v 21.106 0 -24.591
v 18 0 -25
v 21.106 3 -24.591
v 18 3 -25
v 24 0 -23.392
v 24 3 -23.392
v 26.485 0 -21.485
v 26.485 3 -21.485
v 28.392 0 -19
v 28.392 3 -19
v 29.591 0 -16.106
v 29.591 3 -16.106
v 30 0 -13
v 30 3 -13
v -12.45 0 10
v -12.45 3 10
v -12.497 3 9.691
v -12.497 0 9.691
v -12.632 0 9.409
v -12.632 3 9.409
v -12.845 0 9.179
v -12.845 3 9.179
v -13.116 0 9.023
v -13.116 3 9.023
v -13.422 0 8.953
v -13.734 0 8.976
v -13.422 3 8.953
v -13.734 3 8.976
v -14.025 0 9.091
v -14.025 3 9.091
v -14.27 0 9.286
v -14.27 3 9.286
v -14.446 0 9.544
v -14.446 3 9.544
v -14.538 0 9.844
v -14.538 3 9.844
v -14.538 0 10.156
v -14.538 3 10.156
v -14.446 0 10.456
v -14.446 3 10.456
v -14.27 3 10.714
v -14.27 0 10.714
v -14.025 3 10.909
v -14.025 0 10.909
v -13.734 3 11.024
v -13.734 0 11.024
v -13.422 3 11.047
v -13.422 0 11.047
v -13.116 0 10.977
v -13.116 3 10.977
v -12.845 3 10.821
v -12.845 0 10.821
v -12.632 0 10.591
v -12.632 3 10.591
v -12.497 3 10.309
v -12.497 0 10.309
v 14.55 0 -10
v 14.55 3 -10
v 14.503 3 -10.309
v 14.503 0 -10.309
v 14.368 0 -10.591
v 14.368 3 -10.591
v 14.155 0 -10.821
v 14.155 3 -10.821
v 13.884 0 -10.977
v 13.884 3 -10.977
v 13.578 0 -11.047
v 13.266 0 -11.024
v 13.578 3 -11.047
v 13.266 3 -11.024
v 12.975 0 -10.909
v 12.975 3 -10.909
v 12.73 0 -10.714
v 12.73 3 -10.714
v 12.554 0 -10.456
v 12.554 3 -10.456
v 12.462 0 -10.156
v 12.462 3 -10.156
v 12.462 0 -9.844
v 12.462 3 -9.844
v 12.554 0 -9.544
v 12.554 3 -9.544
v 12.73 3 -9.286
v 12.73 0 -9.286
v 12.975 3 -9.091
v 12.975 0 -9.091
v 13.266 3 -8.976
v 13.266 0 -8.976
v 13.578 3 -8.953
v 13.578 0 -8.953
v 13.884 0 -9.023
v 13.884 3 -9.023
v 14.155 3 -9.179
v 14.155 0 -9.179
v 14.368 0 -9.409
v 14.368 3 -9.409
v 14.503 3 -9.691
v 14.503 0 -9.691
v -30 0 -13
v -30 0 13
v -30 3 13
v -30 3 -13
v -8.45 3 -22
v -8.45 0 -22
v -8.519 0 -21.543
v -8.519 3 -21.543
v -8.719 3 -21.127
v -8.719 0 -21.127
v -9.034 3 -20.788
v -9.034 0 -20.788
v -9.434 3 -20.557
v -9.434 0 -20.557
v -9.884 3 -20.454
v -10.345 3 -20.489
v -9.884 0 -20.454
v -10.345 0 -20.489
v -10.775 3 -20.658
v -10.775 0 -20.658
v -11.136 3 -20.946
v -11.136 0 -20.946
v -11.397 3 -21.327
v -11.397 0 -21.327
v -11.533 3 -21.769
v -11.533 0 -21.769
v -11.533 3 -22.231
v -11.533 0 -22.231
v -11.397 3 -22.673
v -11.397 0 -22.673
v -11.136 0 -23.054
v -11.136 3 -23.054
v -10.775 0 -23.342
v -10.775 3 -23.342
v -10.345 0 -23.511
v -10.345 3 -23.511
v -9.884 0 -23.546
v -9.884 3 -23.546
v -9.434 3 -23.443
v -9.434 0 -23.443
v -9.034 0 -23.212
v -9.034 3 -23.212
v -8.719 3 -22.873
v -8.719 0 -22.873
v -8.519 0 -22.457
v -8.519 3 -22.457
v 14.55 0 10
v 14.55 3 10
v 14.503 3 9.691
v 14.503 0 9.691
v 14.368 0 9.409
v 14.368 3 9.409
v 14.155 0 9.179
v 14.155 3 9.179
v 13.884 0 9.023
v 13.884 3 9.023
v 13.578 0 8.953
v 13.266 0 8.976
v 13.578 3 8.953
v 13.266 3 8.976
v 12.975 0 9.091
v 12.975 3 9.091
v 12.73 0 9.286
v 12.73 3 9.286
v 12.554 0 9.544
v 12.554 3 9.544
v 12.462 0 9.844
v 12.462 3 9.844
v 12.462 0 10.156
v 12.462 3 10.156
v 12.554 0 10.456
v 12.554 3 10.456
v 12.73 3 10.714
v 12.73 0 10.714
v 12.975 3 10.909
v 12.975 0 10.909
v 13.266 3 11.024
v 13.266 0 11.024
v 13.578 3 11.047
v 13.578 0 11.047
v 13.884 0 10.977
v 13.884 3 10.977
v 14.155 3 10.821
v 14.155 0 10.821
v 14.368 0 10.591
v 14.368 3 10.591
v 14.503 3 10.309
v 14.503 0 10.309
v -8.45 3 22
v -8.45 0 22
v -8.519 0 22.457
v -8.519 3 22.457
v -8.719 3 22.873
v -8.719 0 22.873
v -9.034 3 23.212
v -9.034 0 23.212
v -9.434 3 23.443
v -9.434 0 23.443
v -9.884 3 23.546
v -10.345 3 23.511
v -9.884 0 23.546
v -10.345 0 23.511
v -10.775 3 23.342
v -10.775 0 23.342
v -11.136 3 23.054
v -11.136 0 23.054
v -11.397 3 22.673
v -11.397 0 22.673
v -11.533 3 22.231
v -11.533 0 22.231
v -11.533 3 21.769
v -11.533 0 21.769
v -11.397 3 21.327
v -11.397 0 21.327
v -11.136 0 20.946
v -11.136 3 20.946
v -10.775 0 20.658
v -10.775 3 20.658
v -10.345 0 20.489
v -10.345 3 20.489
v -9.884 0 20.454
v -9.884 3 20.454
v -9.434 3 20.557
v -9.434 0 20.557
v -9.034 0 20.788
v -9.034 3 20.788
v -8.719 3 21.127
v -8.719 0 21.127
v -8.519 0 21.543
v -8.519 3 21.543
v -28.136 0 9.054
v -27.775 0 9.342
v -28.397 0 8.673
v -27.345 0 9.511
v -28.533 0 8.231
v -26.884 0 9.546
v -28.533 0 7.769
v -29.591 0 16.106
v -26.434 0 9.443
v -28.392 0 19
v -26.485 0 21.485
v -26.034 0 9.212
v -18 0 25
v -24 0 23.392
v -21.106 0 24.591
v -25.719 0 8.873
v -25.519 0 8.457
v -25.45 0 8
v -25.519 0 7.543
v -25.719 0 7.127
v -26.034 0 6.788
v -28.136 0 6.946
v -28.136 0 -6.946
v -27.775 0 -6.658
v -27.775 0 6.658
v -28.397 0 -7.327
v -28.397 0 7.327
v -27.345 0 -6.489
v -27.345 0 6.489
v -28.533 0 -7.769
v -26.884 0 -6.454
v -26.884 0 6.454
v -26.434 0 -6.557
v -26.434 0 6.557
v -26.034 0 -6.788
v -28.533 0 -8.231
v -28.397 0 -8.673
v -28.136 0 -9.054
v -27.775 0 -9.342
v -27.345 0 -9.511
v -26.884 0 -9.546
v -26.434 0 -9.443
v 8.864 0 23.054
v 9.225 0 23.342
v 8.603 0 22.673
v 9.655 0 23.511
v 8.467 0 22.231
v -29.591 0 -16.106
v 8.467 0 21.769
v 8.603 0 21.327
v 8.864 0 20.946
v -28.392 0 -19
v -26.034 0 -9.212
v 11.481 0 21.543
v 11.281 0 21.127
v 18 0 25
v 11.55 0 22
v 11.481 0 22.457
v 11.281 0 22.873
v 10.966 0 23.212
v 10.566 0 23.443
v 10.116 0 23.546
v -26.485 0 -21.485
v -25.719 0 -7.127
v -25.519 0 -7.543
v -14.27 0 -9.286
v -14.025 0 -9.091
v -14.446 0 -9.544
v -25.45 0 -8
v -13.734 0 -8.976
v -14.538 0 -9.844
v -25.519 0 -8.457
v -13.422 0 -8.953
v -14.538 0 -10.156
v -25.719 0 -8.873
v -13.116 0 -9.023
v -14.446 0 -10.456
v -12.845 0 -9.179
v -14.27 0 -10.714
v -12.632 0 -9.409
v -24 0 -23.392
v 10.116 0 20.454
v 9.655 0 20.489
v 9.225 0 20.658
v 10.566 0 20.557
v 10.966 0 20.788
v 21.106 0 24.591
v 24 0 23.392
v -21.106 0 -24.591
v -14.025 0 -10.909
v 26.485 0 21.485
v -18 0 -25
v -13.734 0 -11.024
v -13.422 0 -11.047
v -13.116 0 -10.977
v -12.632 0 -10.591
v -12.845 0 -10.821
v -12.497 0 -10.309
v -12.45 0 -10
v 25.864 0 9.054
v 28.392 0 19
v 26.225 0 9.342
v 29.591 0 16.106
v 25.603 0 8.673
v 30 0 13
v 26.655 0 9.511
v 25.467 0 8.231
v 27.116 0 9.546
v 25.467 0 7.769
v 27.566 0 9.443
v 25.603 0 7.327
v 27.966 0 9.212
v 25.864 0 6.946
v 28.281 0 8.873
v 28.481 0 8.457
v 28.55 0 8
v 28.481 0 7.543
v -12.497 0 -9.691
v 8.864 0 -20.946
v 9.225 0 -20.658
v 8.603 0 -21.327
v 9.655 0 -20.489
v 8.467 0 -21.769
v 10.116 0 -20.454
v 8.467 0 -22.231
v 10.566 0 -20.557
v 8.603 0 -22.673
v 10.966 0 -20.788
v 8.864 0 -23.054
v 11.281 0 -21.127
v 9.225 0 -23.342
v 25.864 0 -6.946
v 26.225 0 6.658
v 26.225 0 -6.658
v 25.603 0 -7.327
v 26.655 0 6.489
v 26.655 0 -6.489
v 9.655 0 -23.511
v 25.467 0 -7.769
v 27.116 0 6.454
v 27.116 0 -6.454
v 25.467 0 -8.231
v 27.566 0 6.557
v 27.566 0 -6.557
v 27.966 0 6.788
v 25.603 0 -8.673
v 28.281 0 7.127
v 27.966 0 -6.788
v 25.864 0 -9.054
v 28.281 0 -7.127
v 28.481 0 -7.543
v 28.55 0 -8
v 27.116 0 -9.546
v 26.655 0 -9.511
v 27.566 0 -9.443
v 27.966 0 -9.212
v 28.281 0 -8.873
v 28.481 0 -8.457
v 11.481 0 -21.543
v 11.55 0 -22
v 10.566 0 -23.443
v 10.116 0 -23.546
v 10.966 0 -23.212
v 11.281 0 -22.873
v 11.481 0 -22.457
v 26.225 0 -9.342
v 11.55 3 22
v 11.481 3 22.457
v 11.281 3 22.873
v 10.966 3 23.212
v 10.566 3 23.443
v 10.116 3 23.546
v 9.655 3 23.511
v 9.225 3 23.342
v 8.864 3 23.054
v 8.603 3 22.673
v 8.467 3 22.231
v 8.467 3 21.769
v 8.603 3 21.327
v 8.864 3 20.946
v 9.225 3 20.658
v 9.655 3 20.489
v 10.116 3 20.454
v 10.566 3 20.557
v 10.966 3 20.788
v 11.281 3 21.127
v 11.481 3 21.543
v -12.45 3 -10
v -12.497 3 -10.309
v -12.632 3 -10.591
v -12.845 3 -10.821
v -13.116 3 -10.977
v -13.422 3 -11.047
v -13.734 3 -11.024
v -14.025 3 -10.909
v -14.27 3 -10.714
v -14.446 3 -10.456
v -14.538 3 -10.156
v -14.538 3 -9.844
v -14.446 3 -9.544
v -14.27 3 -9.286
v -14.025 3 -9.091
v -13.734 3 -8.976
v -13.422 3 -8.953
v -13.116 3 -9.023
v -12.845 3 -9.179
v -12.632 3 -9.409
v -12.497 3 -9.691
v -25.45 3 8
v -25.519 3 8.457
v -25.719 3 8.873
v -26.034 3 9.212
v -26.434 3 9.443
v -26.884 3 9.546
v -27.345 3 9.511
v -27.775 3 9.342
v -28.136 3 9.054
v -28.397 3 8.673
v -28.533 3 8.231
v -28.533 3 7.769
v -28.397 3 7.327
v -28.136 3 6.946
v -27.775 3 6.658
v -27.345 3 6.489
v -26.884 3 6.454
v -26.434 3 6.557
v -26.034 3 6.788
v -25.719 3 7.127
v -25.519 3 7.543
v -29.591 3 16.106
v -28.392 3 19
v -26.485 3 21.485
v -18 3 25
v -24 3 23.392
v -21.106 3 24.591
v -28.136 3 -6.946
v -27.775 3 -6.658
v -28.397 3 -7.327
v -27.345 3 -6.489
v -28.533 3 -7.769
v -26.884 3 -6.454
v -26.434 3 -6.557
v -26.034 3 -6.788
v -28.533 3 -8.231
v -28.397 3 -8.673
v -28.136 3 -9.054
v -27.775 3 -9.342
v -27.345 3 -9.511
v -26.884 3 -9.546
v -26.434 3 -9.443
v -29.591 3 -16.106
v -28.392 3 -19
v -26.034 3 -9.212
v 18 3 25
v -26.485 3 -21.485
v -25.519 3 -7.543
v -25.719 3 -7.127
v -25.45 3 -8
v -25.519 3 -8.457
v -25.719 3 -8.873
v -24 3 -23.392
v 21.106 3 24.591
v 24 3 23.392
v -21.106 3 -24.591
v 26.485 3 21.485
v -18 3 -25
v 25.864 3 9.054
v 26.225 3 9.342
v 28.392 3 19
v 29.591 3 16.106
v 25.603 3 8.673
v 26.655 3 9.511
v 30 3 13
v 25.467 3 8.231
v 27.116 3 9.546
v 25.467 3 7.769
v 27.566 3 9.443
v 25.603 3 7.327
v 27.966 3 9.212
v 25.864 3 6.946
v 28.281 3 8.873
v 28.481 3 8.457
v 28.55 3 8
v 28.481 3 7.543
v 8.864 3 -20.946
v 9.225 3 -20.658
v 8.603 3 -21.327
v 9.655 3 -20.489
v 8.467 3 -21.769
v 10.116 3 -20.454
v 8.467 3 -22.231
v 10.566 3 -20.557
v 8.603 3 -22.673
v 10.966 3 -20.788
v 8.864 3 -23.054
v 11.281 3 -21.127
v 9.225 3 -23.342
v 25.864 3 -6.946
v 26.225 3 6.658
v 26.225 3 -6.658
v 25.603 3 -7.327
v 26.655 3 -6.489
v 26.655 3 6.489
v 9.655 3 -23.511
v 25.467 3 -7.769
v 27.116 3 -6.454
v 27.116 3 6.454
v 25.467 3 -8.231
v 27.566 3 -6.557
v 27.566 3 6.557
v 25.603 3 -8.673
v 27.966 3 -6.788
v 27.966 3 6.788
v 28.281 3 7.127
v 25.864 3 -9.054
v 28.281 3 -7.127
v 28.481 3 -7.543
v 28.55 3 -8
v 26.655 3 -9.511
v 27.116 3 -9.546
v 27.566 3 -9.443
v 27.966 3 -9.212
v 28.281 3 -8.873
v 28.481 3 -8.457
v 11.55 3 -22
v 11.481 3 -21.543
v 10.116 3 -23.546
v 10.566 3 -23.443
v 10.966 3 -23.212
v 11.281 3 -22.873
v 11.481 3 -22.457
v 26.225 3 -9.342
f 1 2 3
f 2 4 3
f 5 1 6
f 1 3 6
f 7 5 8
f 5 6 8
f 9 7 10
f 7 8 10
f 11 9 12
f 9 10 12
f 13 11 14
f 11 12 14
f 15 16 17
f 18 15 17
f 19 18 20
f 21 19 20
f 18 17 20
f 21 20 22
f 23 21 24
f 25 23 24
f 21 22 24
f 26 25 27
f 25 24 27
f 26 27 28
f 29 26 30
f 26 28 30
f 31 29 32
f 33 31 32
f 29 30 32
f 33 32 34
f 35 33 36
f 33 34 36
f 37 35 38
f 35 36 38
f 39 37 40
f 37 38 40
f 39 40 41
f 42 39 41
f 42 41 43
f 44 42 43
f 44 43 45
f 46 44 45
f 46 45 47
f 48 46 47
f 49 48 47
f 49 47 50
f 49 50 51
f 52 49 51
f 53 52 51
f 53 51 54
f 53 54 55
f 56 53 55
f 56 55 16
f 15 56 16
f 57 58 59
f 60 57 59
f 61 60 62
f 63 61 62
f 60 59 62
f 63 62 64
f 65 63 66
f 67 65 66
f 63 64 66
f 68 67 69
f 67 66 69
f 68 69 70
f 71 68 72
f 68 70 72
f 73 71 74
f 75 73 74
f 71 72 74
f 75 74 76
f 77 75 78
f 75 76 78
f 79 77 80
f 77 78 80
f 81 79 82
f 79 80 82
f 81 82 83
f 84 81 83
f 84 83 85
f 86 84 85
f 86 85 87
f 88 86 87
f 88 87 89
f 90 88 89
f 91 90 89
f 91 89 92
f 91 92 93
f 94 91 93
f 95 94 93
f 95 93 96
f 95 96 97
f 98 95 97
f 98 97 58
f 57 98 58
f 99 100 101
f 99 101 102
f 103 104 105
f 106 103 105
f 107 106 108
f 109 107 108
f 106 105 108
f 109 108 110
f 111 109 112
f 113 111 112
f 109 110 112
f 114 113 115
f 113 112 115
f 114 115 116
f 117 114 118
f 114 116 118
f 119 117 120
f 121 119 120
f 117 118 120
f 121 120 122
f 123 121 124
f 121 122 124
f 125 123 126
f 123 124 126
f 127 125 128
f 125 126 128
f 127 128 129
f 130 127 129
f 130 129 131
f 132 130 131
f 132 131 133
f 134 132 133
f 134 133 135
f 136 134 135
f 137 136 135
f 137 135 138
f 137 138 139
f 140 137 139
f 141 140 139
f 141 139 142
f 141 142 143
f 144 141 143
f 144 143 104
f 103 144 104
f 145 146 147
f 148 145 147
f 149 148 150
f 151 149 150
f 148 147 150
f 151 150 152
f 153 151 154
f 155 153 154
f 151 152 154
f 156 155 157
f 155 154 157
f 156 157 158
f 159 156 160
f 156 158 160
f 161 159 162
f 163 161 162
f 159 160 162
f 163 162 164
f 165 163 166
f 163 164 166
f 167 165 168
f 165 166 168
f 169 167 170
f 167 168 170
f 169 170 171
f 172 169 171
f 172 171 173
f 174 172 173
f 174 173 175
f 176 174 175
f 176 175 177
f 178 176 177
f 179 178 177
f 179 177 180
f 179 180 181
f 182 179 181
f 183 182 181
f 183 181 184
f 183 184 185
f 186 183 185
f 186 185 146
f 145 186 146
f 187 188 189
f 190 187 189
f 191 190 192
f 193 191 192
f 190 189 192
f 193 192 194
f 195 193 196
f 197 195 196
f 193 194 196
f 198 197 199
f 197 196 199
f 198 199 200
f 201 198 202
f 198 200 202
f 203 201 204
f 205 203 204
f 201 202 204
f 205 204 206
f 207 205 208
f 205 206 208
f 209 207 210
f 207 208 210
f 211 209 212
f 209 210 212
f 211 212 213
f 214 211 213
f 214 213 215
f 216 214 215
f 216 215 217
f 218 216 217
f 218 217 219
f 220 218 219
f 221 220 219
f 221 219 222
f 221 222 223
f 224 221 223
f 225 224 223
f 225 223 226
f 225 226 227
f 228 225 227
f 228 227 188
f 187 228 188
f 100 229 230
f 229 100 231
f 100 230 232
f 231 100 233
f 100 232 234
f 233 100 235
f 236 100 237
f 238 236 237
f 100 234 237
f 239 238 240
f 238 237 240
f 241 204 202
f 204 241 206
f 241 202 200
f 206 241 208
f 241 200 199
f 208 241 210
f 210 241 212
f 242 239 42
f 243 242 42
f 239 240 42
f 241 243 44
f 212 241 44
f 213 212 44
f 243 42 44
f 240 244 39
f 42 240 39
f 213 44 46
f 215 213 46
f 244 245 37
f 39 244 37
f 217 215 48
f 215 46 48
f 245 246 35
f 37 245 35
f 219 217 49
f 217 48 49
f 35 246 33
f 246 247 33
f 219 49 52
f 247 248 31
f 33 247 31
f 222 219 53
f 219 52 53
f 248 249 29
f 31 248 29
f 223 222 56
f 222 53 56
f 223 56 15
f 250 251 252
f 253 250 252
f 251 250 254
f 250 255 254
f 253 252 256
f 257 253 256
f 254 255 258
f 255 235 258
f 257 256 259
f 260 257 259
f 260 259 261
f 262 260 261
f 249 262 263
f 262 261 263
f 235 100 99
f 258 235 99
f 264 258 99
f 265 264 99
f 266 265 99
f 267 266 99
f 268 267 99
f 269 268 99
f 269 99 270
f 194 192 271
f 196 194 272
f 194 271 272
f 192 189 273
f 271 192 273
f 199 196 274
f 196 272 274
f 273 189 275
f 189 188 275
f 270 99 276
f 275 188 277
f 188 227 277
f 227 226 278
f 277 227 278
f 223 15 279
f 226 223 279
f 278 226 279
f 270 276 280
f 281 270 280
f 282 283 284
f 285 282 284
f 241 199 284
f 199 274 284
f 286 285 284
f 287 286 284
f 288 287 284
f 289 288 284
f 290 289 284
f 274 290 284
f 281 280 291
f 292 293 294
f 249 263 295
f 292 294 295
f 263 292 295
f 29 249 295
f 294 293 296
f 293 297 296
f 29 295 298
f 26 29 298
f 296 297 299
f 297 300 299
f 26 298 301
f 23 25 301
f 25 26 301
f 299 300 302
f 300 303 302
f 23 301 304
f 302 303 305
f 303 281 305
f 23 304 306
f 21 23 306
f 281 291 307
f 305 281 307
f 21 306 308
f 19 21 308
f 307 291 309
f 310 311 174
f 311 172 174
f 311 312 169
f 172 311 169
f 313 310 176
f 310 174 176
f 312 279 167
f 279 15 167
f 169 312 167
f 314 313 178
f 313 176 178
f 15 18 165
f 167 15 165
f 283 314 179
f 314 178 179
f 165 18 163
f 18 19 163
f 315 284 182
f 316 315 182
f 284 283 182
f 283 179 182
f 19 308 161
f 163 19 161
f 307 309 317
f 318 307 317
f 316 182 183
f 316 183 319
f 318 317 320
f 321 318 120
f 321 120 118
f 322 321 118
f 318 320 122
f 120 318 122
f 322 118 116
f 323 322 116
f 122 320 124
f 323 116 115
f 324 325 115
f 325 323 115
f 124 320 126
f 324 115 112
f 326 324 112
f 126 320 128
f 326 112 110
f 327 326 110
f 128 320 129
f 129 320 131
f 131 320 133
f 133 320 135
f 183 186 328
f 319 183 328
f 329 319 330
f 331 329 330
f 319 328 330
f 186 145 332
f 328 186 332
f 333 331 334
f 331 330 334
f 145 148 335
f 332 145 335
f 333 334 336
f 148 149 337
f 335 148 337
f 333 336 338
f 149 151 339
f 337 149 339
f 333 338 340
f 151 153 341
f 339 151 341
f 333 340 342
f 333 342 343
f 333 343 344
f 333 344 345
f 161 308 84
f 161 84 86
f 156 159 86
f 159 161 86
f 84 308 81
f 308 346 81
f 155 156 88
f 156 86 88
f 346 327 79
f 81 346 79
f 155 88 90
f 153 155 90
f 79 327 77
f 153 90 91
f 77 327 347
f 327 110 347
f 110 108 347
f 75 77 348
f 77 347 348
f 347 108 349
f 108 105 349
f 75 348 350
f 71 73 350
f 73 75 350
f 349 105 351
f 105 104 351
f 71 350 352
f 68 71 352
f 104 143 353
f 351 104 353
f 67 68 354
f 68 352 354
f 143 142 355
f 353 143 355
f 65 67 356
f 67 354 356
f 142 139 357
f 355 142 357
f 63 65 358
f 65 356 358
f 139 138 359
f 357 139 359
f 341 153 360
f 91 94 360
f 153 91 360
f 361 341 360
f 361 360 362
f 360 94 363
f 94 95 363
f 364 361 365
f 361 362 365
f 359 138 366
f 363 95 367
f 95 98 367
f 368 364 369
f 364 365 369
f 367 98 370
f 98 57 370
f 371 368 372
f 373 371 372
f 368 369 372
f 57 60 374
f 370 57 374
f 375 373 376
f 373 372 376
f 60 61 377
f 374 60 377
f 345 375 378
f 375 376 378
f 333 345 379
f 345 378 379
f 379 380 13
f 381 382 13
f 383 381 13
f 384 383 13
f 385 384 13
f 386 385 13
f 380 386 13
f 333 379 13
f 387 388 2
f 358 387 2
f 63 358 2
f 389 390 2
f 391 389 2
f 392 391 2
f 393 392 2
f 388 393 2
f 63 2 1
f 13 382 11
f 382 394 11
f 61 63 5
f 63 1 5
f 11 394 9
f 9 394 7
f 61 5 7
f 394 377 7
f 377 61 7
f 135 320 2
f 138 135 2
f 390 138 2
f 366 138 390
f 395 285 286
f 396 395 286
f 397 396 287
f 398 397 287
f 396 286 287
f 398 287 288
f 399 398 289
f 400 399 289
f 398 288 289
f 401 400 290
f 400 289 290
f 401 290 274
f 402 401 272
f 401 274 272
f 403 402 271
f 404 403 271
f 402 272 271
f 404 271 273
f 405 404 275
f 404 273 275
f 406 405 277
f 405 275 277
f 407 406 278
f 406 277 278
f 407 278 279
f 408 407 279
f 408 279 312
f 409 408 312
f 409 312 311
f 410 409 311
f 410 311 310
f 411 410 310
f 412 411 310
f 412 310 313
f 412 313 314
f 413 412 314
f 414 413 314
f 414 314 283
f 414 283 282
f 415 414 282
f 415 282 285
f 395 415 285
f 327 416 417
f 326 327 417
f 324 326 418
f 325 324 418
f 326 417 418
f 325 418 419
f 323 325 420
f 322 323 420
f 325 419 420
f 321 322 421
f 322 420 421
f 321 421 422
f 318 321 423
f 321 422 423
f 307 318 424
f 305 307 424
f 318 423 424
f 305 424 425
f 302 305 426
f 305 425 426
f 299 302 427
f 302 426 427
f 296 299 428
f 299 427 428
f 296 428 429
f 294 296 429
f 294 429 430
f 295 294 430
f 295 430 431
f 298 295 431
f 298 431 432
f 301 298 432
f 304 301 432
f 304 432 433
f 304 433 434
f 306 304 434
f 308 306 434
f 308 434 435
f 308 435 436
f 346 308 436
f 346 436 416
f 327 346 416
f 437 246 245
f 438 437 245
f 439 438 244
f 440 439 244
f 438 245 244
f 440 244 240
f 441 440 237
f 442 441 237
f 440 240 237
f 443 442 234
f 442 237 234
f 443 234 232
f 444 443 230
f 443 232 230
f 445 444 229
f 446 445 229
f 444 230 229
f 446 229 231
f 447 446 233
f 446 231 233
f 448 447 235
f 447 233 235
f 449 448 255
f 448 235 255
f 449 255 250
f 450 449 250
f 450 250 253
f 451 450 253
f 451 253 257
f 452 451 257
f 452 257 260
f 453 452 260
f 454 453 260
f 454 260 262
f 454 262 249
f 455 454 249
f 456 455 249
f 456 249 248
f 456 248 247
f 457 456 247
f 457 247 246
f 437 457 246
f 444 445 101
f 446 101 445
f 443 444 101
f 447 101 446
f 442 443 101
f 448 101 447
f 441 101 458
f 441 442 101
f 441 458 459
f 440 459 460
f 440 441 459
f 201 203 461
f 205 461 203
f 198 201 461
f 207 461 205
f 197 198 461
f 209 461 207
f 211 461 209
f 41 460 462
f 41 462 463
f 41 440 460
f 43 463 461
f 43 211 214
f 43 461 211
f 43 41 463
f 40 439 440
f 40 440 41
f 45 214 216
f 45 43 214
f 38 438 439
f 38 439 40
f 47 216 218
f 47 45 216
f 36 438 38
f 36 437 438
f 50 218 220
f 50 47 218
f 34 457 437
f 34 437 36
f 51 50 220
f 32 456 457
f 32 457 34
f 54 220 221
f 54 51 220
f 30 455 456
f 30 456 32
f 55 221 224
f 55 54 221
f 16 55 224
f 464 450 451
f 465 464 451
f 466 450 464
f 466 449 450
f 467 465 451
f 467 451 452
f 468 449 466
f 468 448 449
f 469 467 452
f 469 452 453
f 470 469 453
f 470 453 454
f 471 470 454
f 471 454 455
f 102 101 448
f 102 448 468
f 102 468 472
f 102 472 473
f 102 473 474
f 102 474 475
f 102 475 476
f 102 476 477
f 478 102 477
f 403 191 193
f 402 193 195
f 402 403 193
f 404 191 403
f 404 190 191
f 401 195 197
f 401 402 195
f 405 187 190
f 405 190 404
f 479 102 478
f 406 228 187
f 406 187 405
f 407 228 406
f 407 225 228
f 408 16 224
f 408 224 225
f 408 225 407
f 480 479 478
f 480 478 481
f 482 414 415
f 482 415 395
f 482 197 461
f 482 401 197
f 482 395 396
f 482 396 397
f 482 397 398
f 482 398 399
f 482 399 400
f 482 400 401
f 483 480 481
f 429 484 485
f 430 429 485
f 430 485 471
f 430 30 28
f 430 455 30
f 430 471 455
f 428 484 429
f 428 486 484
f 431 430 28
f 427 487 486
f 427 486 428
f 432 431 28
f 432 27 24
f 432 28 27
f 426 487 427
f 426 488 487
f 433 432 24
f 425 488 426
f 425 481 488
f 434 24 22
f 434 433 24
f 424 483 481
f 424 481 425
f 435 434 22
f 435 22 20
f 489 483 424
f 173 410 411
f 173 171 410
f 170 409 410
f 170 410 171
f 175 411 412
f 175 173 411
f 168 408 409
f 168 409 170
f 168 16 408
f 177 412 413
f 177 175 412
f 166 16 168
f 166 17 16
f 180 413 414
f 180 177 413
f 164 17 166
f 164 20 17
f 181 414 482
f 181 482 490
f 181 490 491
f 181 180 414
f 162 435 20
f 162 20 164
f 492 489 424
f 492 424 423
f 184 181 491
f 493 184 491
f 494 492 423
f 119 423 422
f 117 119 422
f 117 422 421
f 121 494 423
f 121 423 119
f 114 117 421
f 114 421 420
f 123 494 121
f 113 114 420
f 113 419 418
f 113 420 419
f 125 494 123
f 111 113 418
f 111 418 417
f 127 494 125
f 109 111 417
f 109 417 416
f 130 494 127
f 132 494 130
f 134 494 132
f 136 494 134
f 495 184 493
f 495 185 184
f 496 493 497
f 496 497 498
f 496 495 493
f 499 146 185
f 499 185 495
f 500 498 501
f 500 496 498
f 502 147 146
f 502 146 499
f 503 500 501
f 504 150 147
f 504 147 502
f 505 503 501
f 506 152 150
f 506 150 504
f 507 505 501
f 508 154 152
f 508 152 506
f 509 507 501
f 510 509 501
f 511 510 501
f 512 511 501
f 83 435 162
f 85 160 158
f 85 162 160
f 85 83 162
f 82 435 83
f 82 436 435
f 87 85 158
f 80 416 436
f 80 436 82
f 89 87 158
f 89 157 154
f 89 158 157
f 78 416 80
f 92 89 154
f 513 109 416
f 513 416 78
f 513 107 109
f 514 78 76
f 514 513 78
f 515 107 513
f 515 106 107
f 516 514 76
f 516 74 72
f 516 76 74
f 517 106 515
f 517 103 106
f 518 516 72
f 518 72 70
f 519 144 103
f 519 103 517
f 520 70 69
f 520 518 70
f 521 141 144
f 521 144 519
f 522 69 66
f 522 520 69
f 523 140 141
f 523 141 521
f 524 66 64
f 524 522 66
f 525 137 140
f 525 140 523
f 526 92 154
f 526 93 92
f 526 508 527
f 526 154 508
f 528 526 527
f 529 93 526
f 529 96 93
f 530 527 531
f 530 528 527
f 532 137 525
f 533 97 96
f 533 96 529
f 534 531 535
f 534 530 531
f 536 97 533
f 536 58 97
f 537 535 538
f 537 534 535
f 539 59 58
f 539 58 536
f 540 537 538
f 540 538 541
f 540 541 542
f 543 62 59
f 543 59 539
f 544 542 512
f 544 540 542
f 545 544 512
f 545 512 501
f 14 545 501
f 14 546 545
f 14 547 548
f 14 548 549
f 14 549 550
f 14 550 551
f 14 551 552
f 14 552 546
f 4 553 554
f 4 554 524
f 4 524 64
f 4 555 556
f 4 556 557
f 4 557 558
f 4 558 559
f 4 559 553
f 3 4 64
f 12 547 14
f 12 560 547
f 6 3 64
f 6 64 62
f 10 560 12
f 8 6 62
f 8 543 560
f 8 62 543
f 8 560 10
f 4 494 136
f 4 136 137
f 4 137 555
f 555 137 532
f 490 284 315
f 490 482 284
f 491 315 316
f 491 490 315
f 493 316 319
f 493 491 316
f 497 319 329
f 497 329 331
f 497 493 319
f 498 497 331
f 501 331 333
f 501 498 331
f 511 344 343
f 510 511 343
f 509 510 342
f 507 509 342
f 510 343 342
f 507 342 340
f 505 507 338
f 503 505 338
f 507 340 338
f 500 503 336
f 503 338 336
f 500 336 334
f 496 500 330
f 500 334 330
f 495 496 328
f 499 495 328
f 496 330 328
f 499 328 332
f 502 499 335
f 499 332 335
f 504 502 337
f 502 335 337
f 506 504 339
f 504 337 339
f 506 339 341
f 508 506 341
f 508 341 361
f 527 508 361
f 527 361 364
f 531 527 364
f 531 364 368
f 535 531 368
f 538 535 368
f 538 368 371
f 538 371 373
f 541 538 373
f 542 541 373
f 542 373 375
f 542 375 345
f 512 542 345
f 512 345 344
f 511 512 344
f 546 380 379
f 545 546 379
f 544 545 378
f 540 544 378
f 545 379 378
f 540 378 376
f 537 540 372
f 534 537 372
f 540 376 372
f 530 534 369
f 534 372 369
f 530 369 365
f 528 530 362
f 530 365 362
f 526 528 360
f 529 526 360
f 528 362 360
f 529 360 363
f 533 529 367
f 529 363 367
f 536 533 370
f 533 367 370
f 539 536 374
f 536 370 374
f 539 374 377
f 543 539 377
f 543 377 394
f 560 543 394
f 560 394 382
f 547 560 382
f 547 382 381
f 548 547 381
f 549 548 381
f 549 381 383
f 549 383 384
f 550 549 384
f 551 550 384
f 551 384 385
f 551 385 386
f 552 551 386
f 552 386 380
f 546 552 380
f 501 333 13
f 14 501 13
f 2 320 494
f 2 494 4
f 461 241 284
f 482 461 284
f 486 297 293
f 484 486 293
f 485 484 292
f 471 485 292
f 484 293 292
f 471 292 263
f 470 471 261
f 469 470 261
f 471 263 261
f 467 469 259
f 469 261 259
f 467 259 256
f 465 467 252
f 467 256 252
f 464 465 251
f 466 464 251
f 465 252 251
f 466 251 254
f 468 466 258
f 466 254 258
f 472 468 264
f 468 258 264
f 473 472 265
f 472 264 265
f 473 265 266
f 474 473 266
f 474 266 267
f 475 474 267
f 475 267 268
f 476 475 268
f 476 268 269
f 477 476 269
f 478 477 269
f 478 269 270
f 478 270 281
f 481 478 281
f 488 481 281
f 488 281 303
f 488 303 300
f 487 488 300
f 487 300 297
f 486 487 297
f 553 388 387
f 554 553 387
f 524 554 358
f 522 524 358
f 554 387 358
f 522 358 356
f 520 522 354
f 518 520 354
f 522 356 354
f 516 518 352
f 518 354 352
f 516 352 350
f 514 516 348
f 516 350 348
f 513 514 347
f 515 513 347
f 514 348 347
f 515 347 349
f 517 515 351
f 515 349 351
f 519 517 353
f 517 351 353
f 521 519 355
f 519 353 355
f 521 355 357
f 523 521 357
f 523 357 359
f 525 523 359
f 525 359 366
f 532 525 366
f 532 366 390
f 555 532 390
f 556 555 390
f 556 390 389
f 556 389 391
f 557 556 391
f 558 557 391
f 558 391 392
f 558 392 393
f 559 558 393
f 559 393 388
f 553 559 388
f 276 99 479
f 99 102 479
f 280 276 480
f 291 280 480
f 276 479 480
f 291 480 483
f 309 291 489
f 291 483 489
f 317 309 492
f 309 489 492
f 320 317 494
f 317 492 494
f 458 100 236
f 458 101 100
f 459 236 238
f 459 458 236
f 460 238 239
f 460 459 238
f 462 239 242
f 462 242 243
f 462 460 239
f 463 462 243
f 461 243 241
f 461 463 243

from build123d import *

# Parameters (mm, degrees)
SKETCH_1_W          = 60
SKETCH_1_H          = 50
EXTRUDE_1_DEPTH     = 3
SKETCH_7_R          = 1.05
CUT_EXTRUDE_1_DEPTH = 10
SKETCH_8_R          = 1.55
CUT_EXTRUDE_2_DEPTH = 10
FILLET_1_R          = 12


with BuildPart() as part:
    # 草图1 → 凸台-拉伸1 (new body)
    with BuildSketch(Plane(origin=(0, 0, 0), x_dir=(1, 0, 0), z_dir=(0, 1, 0))):
        Rectangle(SKETCH_1_W, SKETCH_1_H)
    extrude(amount=EXTRUDE_1_DEPTH)

    # 草图7 → 切除-拉伸1 (cut)
    with BuildSketch(Plane(origin=(0, 3, 0), x_dir=(1, 0, 0), z_dir=(0, 1, 0))):
        with Locations((13.5, 10)):
            Circle(SKETCH_7_R)
        with Locations((-13.5, 10)):
            Circle(SKETCH_7_R)
        with Locations((-13.5, -10)):
            Circle(SKETCH_7_R)
        with Locations((13.5, -10)):
            Circle(SKETCH_7_R)
    extrude(amount=-CUT_EXTRUDE_1_DEPTH, mode=Mode.SUBTRACT)

    # 草图8 → 切除-拉伸2 (cut)
    with BuildSketch(Plane.XZ):
        with Locations((27, 8)):
            Circle(SKETCH_8_R)
        with Locations((10, 22)):
            Circle(SKETCH_8_R)
        with Locations((-10, 22)):
            Circle(SKETCH_8_R)
        with Locations((-27, 8)):
            Circle(SKETCH_8_R)
        with Locations((-27, -8)):
            Circle(SKETCH_8_R)
        with Locations((-10, -22)):
            Circle(SKETCH_8_R)
        with Locations((10, -22)):
            Circle(SKETCH_8_R)
        with Locations((27, -8)):
            Circle(SKETCH_8_R)
    extrude(amount=-CUT_EXTRUDE_2_DEPTH, mode=Mode.SUBTRACT)

    # 圆角1
    fillet_1_edges = [part.edges().sort_by_distance(p)[0] for p in [
        (30, 1.5, 25),
        (-30, 1.5, 25),
        (-30, 1.5, -25),
        (30, 1.5, -25),
    ]]
    fillet(fillet_1_edges, radius=FILLET_1_R)


solid = part.part
